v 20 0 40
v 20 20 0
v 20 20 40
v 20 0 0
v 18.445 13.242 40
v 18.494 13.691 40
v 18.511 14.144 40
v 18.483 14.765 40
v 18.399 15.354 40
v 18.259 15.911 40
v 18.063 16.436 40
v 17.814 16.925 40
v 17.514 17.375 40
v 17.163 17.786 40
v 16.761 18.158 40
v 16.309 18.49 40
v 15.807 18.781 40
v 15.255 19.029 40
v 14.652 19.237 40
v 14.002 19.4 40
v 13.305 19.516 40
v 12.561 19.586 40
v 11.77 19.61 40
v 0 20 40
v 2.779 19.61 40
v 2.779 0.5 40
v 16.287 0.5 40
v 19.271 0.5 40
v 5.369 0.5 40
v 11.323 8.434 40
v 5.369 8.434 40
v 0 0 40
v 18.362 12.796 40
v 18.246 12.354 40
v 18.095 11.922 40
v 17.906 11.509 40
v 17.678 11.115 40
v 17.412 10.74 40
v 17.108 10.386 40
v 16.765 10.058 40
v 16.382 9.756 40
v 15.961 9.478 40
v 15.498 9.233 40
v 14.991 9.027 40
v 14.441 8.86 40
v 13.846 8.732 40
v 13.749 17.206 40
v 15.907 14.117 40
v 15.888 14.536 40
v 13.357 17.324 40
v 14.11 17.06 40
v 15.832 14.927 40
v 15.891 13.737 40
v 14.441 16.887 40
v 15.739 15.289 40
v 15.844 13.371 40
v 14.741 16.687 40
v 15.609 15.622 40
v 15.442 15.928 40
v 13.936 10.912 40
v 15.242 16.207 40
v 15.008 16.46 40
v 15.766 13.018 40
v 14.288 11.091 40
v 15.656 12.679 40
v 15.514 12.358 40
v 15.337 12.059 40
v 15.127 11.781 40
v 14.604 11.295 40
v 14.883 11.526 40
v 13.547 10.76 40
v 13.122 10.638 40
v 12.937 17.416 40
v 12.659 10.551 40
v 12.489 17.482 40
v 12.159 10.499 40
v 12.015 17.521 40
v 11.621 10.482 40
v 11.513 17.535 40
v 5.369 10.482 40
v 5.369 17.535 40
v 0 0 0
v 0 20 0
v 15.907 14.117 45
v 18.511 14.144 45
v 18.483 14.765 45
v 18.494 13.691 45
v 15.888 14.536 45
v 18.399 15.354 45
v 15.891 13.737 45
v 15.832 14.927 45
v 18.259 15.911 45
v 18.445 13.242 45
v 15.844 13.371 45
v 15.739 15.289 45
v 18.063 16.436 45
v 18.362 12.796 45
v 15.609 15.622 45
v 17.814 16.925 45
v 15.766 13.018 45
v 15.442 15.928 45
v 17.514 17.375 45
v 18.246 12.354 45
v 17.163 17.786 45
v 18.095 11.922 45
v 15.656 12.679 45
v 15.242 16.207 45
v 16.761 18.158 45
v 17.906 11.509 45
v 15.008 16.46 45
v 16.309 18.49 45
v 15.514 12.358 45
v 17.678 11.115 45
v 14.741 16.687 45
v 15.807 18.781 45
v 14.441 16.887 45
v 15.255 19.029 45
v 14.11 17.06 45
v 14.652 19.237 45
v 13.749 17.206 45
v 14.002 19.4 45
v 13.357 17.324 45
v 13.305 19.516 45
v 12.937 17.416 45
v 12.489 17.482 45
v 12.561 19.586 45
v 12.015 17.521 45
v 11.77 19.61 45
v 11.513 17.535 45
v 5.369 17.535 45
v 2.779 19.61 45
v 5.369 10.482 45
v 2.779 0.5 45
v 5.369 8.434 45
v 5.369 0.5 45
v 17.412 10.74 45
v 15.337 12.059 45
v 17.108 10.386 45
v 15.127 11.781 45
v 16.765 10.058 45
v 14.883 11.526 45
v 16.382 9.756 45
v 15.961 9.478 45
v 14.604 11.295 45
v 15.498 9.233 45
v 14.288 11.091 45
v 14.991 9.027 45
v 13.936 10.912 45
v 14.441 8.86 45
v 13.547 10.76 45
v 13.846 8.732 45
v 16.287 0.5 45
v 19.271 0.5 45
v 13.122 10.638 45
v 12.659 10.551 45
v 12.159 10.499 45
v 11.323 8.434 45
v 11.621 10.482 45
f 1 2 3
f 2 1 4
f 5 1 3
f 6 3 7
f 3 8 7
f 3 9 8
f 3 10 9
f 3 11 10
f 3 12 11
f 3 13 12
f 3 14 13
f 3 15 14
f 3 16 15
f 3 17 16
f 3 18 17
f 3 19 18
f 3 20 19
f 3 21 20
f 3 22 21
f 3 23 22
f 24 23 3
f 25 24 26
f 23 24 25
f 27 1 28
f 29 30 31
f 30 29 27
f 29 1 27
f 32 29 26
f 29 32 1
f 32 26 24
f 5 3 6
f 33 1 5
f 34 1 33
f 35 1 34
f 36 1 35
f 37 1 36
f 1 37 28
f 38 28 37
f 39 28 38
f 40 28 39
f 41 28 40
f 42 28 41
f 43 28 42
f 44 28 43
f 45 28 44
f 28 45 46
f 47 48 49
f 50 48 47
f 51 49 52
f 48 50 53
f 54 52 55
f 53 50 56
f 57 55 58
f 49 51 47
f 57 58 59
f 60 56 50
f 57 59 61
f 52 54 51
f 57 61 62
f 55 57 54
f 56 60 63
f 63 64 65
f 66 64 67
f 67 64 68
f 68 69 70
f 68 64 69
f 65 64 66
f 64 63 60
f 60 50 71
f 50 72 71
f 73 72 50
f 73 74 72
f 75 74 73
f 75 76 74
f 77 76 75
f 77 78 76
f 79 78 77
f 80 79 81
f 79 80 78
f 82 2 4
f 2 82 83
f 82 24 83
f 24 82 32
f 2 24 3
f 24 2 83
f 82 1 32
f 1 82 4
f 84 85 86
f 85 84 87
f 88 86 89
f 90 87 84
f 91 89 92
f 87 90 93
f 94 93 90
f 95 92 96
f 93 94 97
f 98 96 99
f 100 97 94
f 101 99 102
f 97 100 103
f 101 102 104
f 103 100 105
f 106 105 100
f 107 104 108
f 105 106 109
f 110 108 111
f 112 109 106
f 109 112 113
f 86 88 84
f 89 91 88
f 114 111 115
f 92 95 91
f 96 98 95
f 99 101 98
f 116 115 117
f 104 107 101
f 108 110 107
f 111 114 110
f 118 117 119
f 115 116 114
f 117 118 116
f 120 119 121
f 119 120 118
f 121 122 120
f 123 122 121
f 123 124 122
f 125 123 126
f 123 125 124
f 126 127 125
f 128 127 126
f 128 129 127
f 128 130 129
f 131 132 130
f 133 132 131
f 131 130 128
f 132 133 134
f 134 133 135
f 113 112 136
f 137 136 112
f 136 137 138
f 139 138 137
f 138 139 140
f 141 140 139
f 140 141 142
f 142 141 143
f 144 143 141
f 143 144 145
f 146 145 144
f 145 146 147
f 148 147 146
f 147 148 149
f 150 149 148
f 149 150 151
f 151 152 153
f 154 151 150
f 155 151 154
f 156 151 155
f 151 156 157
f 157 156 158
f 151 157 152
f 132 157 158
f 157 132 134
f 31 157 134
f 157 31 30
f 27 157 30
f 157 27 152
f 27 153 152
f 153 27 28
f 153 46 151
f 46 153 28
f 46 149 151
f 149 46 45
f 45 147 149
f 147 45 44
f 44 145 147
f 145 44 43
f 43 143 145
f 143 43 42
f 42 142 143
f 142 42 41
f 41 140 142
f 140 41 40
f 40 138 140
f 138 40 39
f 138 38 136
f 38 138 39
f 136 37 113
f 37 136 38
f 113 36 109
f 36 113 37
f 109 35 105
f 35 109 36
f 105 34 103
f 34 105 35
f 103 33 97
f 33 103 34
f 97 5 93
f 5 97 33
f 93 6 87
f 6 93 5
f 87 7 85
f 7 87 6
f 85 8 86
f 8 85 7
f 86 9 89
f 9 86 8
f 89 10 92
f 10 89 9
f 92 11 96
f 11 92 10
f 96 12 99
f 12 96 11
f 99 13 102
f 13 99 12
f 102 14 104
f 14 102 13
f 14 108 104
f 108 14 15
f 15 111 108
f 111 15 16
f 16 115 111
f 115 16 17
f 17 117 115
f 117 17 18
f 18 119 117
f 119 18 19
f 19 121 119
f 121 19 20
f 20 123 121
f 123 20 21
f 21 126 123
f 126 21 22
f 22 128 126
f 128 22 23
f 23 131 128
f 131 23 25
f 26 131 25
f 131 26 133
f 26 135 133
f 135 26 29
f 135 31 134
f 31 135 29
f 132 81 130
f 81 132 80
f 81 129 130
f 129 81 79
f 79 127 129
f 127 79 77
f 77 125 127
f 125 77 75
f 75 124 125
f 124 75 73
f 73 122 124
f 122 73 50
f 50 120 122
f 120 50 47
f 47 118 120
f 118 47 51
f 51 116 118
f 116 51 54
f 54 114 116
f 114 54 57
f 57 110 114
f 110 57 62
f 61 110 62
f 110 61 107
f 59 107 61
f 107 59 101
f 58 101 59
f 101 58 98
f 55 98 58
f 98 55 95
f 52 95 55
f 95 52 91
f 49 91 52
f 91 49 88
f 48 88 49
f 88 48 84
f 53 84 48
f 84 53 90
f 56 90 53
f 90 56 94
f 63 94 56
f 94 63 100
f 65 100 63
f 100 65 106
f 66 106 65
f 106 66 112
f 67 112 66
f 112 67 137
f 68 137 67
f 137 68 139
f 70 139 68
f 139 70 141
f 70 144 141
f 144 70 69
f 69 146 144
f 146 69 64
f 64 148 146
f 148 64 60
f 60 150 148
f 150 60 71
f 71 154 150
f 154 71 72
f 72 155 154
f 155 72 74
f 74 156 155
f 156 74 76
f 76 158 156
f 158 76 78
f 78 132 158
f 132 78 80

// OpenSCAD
cube([20, 20, 40]);
translate([0.5, 0.5, 40]){
    linear_extrude(5){
        text("R", size=20);
    }
}
